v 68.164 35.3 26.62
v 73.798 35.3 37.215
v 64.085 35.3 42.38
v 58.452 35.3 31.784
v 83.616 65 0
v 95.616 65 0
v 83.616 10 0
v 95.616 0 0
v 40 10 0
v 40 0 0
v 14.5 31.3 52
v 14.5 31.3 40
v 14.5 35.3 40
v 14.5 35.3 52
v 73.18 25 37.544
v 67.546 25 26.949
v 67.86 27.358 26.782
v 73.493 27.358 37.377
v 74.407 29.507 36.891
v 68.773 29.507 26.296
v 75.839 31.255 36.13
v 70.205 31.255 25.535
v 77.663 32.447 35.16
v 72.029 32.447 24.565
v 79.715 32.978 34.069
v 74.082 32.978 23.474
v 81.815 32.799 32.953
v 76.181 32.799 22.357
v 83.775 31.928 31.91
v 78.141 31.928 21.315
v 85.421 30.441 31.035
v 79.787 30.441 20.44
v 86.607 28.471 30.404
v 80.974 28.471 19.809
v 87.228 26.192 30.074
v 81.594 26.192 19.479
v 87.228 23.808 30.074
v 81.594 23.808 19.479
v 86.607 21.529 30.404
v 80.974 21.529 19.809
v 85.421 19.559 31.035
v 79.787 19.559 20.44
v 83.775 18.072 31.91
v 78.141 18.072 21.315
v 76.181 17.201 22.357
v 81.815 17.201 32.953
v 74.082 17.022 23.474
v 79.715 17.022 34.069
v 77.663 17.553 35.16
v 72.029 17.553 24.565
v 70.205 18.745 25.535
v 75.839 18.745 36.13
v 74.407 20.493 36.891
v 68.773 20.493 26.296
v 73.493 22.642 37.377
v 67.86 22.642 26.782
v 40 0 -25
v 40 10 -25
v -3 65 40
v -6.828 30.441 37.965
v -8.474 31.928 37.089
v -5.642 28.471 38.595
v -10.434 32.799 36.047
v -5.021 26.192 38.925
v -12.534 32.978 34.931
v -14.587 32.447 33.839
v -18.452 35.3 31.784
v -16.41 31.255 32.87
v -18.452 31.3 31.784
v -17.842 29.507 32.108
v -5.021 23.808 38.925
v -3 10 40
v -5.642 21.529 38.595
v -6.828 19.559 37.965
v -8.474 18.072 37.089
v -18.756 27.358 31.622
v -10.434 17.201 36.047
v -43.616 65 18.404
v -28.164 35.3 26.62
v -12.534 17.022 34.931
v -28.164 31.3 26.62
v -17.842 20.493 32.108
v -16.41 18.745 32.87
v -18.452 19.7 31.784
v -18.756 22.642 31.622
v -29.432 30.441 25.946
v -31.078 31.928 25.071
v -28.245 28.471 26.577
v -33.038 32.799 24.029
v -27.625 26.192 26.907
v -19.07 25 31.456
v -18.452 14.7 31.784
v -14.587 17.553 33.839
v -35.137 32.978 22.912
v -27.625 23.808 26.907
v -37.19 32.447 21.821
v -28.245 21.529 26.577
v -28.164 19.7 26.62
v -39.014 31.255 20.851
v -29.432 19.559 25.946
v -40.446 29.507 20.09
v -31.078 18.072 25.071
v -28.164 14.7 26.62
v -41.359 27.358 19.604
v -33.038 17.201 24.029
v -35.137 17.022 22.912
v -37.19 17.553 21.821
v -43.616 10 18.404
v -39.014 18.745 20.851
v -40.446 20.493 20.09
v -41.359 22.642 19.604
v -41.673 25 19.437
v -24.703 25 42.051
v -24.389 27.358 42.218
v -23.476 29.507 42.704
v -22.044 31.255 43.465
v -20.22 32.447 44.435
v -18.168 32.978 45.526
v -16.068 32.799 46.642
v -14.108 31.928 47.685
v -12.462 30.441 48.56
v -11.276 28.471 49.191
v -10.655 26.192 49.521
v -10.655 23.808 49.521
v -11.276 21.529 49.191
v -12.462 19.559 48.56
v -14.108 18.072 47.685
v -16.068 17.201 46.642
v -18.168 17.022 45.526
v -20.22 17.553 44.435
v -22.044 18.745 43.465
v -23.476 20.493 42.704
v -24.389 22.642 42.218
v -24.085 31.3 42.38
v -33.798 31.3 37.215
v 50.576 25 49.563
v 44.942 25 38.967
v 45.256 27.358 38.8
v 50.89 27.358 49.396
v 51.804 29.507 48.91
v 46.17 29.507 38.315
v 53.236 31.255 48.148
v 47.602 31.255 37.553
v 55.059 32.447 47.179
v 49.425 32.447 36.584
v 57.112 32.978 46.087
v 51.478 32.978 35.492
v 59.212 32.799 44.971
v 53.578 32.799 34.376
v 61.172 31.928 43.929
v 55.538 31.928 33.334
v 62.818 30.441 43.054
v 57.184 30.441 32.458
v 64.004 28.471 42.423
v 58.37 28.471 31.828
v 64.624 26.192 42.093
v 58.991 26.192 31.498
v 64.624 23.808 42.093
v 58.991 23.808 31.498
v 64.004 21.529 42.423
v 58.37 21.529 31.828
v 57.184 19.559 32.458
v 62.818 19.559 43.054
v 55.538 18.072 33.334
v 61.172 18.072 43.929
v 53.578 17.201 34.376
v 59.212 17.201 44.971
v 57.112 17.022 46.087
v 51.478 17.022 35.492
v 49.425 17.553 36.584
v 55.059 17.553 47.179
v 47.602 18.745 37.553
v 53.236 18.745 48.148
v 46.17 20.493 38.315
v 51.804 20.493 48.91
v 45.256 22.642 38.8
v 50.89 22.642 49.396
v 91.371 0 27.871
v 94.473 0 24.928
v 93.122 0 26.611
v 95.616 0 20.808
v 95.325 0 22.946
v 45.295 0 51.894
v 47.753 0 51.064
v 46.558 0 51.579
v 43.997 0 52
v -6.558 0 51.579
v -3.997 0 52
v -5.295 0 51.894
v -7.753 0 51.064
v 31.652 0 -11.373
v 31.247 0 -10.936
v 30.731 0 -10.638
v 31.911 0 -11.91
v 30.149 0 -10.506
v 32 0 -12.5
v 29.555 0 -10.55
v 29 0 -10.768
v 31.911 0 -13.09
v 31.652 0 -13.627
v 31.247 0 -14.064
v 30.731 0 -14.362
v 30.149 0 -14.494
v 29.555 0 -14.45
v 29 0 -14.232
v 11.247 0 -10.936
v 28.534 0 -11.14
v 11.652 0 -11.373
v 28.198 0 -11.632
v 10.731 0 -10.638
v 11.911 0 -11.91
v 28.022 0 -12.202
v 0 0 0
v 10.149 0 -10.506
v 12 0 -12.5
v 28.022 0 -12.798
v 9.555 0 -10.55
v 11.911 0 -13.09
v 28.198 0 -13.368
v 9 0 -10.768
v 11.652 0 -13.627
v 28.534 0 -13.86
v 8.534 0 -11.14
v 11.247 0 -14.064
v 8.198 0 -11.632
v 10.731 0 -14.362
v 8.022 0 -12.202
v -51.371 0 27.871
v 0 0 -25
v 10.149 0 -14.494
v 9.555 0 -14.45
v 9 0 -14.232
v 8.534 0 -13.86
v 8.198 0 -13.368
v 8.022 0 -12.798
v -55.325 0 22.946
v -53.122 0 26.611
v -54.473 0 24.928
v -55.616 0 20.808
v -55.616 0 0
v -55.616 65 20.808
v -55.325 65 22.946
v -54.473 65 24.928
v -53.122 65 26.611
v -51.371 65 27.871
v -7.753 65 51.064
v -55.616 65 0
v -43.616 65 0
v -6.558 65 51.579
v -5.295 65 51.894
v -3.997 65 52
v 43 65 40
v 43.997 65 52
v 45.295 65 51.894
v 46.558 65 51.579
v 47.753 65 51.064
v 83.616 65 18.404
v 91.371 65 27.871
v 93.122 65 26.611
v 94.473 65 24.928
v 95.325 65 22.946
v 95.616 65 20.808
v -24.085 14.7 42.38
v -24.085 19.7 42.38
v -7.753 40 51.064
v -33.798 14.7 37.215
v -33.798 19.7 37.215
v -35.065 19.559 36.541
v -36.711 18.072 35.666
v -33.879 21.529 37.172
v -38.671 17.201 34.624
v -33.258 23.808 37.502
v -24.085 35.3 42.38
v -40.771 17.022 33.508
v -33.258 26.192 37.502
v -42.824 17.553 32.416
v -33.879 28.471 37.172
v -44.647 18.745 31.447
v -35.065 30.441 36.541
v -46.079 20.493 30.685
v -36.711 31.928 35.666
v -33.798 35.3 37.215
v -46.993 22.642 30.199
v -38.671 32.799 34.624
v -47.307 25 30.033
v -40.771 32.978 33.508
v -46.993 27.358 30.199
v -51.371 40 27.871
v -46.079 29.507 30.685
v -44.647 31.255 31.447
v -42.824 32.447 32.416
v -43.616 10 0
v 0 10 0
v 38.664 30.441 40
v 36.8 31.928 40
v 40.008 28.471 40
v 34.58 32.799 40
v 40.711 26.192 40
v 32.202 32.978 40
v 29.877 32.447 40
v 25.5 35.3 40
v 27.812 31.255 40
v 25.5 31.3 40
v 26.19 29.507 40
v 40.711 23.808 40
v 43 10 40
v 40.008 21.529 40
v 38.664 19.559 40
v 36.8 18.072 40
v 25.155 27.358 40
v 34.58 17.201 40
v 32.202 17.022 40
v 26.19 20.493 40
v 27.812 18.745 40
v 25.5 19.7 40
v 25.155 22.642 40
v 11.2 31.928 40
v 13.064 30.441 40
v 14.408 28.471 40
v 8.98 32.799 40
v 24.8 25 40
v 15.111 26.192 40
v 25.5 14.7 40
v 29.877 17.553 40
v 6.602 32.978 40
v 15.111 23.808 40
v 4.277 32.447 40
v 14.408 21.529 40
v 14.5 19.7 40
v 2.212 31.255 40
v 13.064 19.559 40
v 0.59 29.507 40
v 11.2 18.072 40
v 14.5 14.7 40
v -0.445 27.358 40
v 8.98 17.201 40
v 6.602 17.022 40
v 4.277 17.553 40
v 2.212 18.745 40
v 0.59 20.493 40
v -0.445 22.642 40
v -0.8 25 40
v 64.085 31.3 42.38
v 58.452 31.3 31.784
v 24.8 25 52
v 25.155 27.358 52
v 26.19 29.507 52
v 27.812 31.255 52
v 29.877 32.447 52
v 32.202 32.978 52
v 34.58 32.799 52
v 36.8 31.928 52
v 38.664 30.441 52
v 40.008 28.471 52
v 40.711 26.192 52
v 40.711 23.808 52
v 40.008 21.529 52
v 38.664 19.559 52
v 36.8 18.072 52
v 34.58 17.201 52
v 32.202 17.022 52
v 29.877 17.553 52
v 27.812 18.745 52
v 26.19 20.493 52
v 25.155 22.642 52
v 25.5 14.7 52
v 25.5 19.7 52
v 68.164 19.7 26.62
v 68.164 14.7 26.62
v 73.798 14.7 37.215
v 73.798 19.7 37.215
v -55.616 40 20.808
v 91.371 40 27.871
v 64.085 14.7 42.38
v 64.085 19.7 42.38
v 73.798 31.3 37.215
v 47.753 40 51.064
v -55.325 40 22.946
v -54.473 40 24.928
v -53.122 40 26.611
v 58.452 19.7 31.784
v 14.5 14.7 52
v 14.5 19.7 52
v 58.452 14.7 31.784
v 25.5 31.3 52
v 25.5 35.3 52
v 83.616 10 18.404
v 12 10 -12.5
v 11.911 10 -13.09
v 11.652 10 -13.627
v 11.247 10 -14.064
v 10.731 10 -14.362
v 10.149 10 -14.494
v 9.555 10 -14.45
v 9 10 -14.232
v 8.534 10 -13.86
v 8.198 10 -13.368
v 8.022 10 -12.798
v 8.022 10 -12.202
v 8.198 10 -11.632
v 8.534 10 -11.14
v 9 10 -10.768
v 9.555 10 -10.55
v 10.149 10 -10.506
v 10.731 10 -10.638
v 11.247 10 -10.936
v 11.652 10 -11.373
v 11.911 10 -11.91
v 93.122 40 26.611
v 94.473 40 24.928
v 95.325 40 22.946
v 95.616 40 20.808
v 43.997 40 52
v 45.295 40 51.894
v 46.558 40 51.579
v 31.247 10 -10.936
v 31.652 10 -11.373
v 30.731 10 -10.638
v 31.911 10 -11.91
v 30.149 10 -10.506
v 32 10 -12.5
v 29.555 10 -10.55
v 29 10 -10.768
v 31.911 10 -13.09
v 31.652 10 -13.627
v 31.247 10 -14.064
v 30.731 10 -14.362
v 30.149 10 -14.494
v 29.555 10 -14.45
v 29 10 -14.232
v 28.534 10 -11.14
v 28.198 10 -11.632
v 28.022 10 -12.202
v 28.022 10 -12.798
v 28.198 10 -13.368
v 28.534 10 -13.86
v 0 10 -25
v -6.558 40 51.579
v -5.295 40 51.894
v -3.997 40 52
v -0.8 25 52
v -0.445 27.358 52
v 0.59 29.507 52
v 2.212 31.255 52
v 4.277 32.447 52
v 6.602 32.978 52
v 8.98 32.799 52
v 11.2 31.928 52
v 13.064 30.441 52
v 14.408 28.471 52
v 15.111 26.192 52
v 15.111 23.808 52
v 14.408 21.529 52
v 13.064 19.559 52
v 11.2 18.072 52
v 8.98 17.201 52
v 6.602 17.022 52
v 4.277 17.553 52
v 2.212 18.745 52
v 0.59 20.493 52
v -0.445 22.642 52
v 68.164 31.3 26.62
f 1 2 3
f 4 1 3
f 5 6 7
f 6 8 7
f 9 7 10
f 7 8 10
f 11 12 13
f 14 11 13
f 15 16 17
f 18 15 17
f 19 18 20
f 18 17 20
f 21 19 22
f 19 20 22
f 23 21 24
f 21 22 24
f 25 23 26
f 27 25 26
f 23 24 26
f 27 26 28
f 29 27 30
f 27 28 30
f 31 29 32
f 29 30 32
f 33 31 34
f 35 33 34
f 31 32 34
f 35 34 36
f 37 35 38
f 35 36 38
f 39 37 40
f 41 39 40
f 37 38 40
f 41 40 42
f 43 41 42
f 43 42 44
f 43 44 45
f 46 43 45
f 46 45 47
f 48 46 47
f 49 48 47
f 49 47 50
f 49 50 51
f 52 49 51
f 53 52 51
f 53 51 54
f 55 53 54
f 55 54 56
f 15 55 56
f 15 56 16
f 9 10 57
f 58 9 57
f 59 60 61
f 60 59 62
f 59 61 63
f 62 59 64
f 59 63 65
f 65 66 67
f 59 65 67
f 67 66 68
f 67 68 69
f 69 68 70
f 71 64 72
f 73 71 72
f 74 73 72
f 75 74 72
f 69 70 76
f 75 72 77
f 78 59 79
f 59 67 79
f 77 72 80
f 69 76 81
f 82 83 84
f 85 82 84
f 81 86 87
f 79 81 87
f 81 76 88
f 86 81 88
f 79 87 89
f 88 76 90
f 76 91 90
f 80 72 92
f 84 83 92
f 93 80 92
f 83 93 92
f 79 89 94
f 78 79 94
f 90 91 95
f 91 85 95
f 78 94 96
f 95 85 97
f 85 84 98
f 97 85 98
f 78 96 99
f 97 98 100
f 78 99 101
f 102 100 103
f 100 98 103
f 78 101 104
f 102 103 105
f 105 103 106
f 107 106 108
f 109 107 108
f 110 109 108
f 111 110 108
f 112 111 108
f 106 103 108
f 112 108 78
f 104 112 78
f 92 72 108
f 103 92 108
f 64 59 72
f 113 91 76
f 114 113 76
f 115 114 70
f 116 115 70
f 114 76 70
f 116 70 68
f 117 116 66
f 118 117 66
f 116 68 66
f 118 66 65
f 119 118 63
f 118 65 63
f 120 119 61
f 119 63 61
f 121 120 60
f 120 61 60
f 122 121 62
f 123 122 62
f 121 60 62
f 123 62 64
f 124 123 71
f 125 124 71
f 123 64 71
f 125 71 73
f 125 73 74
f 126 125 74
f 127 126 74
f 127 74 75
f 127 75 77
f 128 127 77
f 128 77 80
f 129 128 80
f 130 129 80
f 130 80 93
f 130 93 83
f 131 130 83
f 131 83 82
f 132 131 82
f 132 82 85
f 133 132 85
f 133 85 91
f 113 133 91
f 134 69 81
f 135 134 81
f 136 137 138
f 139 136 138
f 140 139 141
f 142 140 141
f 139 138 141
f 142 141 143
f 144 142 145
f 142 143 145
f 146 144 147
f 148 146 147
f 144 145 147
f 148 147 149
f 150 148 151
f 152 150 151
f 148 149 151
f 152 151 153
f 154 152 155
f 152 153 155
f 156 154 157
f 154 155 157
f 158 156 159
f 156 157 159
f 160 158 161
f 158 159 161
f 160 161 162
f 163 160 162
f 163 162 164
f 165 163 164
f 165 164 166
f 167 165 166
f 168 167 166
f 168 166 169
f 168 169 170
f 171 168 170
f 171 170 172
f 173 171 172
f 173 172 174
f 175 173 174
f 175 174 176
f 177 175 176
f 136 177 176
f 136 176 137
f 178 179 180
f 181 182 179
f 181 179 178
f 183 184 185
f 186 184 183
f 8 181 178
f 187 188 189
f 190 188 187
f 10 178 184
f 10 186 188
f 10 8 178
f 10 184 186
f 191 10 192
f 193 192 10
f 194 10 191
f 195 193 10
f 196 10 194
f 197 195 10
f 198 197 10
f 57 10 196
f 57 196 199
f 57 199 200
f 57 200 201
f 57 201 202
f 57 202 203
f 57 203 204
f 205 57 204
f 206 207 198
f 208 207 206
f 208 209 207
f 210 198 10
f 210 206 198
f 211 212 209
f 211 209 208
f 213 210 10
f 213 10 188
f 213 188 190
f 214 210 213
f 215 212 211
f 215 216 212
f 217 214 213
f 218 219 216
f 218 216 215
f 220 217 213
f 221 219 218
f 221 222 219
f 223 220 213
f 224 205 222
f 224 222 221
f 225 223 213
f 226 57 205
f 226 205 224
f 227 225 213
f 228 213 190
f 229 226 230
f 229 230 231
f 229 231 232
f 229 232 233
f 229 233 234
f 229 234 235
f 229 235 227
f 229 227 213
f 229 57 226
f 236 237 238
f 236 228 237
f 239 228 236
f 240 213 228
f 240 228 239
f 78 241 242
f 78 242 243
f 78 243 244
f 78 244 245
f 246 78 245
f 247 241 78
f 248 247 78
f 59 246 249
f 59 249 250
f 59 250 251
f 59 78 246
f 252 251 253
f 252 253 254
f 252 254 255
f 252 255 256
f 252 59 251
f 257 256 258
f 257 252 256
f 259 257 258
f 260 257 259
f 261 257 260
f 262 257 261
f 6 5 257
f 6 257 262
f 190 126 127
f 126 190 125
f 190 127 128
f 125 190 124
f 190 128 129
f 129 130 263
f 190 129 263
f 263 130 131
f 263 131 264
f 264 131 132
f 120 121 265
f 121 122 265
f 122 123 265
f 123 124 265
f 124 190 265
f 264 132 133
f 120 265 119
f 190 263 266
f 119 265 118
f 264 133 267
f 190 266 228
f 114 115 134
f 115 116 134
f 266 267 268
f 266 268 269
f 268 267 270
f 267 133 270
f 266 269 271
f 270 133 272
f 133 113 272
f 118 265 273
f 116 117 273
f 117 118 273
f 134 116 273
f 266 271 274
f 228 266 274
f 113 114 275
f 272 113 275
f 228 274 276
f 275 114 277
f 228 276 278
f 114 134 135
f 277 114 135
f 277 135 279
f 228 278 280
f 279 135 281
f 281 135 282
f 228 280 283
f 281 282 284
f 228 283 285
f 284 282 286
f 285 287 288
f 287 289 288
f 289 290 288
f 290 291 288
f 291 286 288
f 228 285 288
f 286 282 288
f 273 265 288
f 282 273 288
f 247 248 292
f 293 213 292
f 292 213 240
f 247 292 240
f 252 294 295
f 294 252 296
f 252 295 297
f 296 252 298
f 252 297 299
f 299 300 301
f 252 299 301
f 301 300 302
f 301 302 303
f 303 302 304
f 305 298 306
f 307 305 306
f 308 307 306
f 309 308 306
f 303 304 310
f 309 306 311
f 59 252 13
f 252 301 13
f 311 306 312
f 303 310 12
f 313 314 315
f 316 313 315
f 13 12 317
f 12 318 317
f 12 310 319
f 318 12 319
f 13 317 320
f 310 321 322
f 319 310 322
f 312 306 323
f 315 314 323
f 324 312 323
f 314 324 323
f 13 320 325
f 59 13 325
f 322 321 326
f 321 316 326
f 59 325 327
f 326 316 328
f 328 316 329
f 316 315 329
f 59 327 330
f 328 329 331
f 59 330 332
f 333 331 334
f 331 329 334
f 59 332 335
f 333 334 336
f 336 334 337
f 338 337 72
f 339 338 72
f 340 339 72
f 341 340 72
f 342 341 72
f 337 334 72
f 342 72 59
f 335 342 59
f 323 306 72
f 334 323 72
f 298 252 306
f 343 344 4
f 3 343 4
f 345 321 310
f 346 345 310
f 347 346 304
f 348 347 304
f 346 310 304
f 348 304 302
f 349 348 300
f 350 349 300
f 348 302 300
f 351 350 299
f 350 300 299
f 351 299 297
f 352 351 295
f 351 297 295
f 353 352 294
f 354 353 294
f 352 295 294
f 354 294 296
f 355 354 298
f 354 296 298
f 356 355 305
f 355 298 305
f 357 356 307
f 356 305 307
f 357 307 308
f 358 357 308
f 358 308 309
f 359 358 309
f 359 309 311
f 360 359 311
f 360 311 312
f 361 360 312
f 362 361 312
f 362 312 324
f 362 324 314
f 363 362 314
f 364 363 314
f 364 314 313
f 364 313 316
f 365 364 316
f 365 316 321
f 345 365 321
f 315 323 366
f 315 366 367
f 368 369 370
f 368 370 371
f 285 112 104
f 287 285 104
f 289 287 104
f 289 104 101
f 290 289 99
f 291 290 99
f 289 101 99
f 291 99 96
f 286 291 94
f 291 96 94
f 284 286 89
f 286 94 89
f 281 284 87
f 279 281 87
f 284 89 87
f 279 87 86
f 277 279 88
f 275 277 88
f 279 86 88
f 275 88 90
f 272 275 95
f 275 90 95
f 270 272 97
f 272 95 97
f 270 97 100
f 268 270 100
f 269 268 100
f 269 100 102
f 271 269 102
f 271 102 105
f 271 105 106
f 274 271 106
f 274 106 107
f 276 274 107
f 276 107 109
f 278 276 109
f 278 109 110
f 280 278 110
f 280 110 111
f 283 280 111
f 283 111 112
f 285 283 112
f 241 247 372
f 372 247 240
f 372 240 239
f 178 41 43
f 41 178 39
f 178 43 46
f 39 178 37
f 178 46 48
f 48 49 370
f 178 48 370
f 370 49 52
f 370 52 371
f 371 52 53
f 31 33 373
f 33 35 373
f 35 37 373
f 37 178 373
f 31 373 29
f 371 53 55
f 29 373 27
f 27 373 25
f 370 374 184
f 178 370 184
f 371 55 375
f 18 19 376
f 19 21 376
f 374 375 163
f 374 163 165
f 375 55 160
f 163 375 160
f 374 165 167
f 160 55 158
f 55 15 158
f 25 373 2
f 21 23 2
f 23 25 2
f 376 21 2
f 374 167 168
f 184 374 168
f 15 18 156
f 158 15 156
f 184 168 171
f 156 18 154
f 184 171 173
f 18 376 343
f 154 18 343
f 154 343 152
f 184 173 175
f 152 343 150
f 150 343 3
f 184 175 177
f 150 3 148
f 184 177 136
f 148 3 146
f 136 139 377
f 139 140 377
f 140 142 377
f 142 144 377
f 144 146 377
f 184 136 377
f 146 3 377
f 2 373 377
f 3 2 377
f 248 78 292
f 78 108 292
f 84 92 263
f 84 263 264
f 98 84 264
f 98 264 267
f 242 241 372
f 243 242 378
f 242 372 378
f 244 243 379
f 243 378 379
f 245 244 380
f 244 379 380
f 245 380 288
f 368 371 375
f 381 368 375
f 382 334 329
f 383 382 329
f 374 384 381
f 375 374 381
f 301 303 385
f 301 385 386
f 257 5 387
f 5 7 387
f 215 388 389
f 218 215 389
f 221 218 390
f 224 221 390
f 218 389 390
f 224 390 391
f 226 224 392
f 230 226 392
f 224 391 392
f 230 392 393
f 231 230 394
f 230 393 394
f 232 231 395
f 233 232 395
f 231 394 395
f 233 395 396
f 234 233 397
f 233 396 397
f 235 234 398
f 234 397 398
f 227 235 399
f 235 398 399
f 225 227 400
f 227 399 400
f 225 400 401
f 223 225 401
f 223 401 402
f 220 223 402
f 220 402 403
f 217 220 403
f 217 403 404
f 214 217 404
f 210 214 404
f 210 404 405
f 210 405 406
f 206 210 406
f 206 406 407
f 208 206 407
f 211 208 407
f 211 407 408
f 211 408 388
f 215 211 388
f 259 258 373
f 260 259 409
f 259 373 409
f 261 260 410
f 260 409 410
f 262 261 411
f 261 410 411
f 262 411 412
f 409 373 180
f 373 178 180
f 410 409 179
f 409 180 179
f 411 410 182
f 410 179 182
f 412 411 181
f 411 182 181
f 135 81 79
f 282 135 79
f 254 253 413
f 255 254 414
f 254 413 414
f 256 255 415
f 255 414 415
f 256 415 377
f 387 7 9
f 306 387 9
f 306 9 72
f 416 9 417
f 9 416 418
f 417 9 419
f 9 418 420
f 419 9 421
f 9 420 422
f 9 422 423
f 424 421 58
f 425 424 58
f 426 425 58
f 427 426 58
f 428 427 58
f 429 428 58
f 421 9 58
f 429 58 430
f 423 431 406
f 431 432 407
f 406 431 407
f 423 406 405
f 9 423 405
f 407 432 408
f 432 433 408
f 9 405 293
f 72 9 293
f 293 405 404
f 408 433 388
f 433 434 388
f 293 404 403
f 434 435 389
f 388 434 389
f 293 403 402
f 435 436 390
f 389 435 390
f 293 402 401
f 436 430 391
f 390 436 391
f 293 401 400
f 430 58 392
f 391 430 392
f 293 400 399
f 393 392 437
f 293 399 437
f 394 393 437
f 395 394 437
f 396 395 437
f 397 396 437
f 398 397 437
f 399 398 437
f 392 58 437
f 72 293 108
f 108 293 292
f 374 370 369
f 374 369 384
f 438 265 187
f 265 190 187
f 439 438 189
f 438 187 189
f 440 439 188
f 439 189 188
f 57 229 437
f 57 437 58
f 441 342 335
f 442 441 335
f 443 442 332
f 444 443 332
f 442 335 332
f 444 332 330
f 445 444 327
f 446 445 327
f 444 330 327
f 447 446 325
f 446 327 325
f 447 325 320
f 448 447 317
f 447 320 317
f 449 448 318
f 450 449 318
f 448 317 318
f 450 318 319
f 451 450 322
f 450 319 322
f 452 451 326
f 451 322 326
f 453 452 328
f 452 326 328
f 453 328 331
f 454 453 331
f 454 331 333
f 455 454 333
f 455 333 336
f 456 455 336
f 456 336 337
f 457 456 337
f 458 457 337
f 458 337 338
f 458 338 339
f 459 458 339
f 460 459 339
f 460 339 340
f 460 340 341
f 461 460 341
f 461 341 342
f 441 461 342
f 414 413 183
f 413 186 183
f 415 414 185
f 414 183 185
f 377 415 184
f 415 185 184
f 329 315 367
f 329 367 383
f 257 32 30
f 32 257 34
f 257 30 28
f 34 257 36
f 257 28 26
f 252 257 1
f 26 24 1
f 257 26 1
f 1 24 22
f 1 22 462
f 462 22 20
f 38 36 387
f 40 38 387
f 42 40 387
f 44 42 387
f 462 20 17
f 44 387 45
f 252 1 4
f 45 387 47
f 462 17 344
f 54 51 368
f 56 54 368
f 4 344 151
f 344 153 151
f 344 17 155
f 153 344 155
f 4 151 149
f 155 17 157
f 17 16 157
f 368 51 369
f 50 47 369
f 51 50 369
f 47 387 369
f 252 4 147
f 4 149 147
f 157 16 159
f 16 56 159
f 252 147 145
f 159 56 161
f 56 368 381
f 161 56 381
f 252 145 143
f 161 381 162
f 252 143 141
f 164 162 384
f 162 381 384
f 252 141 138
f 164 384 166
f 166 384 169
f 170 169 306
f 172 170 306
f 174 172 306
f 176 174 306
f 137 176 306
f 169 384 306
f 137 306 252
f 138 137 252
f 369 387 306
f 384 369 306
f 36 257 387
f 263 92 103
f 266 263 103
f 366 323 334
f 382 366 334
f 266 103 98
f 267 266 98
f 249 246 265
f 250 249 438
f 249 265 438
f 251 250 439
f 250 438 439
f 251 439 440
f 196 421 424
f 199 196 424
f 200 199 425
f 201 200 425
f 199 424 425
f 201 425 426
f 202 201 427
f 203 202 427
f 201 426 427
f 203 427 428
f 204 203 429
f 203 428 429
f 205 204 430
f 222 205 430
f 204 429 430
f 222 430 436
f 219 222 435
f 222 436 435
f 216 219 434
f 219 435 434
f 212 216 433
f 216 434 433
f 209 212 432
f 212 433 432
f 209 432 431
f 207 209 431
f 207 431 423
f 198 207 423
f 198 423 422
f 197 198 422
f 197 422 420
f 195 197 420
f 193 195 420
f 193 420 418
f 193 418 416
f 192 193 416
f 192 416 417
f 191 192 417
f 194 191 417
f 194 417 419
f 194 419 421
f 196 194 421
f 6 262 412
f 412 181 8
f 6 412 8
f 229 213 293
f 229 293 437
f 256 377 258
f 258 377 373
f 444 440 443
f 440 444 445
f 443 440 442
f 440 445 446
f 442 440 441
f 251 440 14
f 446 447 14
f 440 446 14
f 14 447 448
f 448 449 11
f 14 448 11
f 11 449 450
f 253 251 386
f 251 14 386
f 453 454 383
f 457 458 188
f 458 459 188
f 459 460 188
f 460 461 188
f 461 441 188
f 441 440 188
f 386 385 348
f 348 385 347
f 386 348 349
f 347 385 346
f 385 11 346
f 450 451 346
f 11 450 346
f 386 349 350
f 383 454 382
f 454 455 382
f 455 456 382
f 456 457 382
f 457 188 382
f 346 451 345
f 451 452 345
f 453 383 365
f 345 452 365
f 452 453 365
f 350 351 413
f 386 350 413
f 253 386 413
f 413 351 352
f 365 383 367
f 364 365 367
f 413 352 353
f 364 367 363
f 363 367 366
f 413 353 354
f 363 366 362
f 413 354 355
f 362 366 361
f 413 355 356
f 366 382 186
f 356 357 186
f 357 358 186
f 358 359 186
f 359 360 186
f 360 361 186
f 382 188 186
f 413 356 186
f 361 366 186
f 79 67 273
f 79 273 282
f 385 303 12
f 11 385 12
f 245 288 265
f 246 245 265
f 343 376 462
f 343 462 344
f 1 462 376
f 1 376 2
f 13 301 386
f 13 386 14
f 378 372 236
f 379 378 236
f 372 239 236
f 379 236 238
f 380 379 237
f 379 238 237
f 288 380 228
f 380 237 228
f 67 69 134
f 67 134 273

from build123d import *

# Parameters (mm, degrees)
SKETCH1_W                       = 40
SKETCH1_H                       = 25
BOSS_EXTRUDE1_DEPTH             = 10
BOSS_EXTRUDE2_DEPTH             = 10
EXTRUDE_THIN1_DEPTH             = 30
EXTRUDE_THIN1_DEPTH_BACK        = 10
FILLET1_R                       = 8
SKETCH4_R                       = 8
SKETCH4_W                       = 11
SKETCH4_H                       = 5
SKETCH4_H_2                     = 4
CUT_EXTRUDE1_DEPTH              = 30
CIRPATTERN1_COUNT               = 2
CIRPATTERN1_ANGLE               = 28
CIRPATTERN1_THE_OTHER_WAY_COUNT = 2
CIRPATTERN1_THE_OTHER_WAY_ANGLE = 28
BOSS_EXTRUDE3_DEPTH             = 25
SKETCH7_R                       = 2
CUT_EXTRUDE2_DEPTH              = 11


with BuildPart() as part:
    # Sketch1 → Boss-Extrude1 (new body)
    with BuildSketch(Plane(origin=(0, 0, 0), x_dir=(1, 0, 0), z_dir=(0, 1, 0))):
        with Locations((20, 12.5)):
            Rectangle(SKETCH1_W, SKETCH1_H)
    extrude(amount=BOSS_EXTRUDE1_DEPTH)

    # Sketch2 → Boss-Extrude2 (add)
    with BuildSketch(Plane(origin=(0, 10, 0), x_dir=(1, 0, 0), z_dir=(0, 1, 0))):
        Polygon((43, -40), (-3, -40), (-43.615589272, -18.404308112), (-43.615589272, 0), (0, 0), (40, 0), (83.615589272, 0), (83.615589272, -18.404308112), align=None)
    extrude(amount=-BOSS_EXTRUDE2_DEPTH)

    # Sketch3 → Extrude-Thin1 (add, two sides)
    with BuildSketch(Plane(origin=(0, 10, 0), x_dir=(1, 0, 0), z_dir=(0, 1, 0))) as extrude_thin1_sk:
        Polygon((-43.615589272, 0), (-43.615589272, -18.404308112), (-3, -40), (43, -40), (83.615589272, -18.404308112), (83.615589272, 0), (95.615589272, 0), (95.615589272, -25.61463554), (45.991936034, -52), (-5.991936034, -52), (-55.615589272, -25.61463554), (-55.615589272, 0), align=None)
    extrude(amount=EXTRUDE_THIN1_DEPTH)
    extrude(extrude_thin1_sk.sketch, amount=-EXTRUDE_THIN1_DEPTH_BACK)

    # Fillet1
    fillet1_edges = [part.edges().sort_by_distance(p)[0] for p in [
        (95.615589272, 20, 25.61463554),
        (45.991936034, 20, 52),
        (-5.991936034, 20, 52),
        (-55.615589272, 20, 25.61463554),
    ]]
    fillet(fillet1_edges, radius=FILLET1_R)

    # Sketch4 → Cut-Extrude1 (cut)
    with BuildSketch(Plane(origin=(0, 0, 40), x_dir=(-1, 0, 0), z_dir=(0, 0, -1))):
        with Locations((-32.8, 25)):
            Circle(SKETCH4_R)
        with Locations((-7.2, 25)):
            Circle(SKETCH4_R)
        with Locations((-20, 17.2)):
            Rectangle(SKETCH4_W, SKETCH4_H)
        with Locations((-20, 33.3)):
            Rectangle(SKETCH4_W, SKETCH4_H_2)
    cut_extrude1 = extrude(amount=-CUT_EXTRUDE1_DEPTH, mode=Mode.SUBTRACT)

    # CirPattern1: Cut-Extrude1 ×2 about axis
    cirpattern1_axis = Axis((20, 40, -52.247961471), (0, 1, 0))
    for i in range(1, CIRPATTERN1_COUNT):
        add(cut_extrude1.rotate(cirpattern1_axis, i * CIRPATTERN1_ANGLE / (CIRPATTERN1_COUNT - 1)), mode=Mode.SUBTRACT)

    # CirPattern1 the other way: Cut-Extrude1 ×2 about axis
    cirpattern1_the_other_way_axis = Axis((20, 40, -52.247961471), (0, -1, 0))
    for i in range(1, CIRPATTERN1_THE_OTHER_WAY_COUNT):
        add(cut_extrude1.rotate(cirpattern1_the_other_way_axis, i * CIRPATTERN1_THE_OTHER_WAY_ANGLE / (CIRPATTERN1_THE_OTHER_WAY_COUNT - 1)), mode=Mode.SUBTRACT)

    # Sketch6 → Boss-Extrude3 (add)
    with BuildSketch(Plane(origin=(0, 40, 0), x_dir=(1, 0, 0), z_dir=(0, 1, 0))):
        with BuildLine():
            Line((47.753084514, -51.063580743), (91.371361774, -27.871331331))
            ThreePointArc((91.371361774, -27.871331331), (94.472927677, -24.928055187), (95.615589272, -20.807750588))
            Line((95.615589272, -20.807750588), (95.615589272, 0))
            Line((95.615589272, 0), (83.615589272, 0))
            Line((83.615589272, 0), (83.615589272, -18.404308112))
            Line((83.615589272, -18.404308112), (43, -40))
            Line((43, -40), (-3, -40))
            Line((-3, -40), (-43.615589272, -18.404308112))
            Line((-43.615589272, -18.404308112), (-43.615589272, 0))
            Line((-43.615589272, 0), (-55.615589272, 0))
            Line((-55.615589272, 0), (-55.615589272, -20.807750588))
            ThreePointArc((-55.615589272, -20.807750588), (-54.472927677, -24.928055187), (-51.371361774, -27.871331331))
            Line((-51.371361774, -27.871331331), (-7.753084514, -51.063580743))
            ThreePointArc((-7.753084514, -51.063580743), (-5.932687176, -51.76236581), (-3.997312011, -52))
            Line((-3.997312011, -52), (43.997312011, -52))
            ThreePointArc((43.997312011, -52), (45.932687176, -51.76236581), (47.753084514, -51.063580743))
        make_face()
    extrude(amount=BOSS_EXTRUDE3_DEPTH)

    # Sketch7 → Cut-Extrude2 (cut, through all)
    with BuildSketch(Plane(origin=(0, 10, 0), x_dir=(1, 0, 0), z_dir=(0, 1, 0))):
        with Locations((10, 12.5)):
            Circle(SKETCH7_R)
        with Locations((30, 12.5)):
            Circle(SKETCH7_R)
    extrude(amount=-CUT_EXTRUDE2_DEPTH, mode=Mode.SUBTRACT)


solid = part.part
